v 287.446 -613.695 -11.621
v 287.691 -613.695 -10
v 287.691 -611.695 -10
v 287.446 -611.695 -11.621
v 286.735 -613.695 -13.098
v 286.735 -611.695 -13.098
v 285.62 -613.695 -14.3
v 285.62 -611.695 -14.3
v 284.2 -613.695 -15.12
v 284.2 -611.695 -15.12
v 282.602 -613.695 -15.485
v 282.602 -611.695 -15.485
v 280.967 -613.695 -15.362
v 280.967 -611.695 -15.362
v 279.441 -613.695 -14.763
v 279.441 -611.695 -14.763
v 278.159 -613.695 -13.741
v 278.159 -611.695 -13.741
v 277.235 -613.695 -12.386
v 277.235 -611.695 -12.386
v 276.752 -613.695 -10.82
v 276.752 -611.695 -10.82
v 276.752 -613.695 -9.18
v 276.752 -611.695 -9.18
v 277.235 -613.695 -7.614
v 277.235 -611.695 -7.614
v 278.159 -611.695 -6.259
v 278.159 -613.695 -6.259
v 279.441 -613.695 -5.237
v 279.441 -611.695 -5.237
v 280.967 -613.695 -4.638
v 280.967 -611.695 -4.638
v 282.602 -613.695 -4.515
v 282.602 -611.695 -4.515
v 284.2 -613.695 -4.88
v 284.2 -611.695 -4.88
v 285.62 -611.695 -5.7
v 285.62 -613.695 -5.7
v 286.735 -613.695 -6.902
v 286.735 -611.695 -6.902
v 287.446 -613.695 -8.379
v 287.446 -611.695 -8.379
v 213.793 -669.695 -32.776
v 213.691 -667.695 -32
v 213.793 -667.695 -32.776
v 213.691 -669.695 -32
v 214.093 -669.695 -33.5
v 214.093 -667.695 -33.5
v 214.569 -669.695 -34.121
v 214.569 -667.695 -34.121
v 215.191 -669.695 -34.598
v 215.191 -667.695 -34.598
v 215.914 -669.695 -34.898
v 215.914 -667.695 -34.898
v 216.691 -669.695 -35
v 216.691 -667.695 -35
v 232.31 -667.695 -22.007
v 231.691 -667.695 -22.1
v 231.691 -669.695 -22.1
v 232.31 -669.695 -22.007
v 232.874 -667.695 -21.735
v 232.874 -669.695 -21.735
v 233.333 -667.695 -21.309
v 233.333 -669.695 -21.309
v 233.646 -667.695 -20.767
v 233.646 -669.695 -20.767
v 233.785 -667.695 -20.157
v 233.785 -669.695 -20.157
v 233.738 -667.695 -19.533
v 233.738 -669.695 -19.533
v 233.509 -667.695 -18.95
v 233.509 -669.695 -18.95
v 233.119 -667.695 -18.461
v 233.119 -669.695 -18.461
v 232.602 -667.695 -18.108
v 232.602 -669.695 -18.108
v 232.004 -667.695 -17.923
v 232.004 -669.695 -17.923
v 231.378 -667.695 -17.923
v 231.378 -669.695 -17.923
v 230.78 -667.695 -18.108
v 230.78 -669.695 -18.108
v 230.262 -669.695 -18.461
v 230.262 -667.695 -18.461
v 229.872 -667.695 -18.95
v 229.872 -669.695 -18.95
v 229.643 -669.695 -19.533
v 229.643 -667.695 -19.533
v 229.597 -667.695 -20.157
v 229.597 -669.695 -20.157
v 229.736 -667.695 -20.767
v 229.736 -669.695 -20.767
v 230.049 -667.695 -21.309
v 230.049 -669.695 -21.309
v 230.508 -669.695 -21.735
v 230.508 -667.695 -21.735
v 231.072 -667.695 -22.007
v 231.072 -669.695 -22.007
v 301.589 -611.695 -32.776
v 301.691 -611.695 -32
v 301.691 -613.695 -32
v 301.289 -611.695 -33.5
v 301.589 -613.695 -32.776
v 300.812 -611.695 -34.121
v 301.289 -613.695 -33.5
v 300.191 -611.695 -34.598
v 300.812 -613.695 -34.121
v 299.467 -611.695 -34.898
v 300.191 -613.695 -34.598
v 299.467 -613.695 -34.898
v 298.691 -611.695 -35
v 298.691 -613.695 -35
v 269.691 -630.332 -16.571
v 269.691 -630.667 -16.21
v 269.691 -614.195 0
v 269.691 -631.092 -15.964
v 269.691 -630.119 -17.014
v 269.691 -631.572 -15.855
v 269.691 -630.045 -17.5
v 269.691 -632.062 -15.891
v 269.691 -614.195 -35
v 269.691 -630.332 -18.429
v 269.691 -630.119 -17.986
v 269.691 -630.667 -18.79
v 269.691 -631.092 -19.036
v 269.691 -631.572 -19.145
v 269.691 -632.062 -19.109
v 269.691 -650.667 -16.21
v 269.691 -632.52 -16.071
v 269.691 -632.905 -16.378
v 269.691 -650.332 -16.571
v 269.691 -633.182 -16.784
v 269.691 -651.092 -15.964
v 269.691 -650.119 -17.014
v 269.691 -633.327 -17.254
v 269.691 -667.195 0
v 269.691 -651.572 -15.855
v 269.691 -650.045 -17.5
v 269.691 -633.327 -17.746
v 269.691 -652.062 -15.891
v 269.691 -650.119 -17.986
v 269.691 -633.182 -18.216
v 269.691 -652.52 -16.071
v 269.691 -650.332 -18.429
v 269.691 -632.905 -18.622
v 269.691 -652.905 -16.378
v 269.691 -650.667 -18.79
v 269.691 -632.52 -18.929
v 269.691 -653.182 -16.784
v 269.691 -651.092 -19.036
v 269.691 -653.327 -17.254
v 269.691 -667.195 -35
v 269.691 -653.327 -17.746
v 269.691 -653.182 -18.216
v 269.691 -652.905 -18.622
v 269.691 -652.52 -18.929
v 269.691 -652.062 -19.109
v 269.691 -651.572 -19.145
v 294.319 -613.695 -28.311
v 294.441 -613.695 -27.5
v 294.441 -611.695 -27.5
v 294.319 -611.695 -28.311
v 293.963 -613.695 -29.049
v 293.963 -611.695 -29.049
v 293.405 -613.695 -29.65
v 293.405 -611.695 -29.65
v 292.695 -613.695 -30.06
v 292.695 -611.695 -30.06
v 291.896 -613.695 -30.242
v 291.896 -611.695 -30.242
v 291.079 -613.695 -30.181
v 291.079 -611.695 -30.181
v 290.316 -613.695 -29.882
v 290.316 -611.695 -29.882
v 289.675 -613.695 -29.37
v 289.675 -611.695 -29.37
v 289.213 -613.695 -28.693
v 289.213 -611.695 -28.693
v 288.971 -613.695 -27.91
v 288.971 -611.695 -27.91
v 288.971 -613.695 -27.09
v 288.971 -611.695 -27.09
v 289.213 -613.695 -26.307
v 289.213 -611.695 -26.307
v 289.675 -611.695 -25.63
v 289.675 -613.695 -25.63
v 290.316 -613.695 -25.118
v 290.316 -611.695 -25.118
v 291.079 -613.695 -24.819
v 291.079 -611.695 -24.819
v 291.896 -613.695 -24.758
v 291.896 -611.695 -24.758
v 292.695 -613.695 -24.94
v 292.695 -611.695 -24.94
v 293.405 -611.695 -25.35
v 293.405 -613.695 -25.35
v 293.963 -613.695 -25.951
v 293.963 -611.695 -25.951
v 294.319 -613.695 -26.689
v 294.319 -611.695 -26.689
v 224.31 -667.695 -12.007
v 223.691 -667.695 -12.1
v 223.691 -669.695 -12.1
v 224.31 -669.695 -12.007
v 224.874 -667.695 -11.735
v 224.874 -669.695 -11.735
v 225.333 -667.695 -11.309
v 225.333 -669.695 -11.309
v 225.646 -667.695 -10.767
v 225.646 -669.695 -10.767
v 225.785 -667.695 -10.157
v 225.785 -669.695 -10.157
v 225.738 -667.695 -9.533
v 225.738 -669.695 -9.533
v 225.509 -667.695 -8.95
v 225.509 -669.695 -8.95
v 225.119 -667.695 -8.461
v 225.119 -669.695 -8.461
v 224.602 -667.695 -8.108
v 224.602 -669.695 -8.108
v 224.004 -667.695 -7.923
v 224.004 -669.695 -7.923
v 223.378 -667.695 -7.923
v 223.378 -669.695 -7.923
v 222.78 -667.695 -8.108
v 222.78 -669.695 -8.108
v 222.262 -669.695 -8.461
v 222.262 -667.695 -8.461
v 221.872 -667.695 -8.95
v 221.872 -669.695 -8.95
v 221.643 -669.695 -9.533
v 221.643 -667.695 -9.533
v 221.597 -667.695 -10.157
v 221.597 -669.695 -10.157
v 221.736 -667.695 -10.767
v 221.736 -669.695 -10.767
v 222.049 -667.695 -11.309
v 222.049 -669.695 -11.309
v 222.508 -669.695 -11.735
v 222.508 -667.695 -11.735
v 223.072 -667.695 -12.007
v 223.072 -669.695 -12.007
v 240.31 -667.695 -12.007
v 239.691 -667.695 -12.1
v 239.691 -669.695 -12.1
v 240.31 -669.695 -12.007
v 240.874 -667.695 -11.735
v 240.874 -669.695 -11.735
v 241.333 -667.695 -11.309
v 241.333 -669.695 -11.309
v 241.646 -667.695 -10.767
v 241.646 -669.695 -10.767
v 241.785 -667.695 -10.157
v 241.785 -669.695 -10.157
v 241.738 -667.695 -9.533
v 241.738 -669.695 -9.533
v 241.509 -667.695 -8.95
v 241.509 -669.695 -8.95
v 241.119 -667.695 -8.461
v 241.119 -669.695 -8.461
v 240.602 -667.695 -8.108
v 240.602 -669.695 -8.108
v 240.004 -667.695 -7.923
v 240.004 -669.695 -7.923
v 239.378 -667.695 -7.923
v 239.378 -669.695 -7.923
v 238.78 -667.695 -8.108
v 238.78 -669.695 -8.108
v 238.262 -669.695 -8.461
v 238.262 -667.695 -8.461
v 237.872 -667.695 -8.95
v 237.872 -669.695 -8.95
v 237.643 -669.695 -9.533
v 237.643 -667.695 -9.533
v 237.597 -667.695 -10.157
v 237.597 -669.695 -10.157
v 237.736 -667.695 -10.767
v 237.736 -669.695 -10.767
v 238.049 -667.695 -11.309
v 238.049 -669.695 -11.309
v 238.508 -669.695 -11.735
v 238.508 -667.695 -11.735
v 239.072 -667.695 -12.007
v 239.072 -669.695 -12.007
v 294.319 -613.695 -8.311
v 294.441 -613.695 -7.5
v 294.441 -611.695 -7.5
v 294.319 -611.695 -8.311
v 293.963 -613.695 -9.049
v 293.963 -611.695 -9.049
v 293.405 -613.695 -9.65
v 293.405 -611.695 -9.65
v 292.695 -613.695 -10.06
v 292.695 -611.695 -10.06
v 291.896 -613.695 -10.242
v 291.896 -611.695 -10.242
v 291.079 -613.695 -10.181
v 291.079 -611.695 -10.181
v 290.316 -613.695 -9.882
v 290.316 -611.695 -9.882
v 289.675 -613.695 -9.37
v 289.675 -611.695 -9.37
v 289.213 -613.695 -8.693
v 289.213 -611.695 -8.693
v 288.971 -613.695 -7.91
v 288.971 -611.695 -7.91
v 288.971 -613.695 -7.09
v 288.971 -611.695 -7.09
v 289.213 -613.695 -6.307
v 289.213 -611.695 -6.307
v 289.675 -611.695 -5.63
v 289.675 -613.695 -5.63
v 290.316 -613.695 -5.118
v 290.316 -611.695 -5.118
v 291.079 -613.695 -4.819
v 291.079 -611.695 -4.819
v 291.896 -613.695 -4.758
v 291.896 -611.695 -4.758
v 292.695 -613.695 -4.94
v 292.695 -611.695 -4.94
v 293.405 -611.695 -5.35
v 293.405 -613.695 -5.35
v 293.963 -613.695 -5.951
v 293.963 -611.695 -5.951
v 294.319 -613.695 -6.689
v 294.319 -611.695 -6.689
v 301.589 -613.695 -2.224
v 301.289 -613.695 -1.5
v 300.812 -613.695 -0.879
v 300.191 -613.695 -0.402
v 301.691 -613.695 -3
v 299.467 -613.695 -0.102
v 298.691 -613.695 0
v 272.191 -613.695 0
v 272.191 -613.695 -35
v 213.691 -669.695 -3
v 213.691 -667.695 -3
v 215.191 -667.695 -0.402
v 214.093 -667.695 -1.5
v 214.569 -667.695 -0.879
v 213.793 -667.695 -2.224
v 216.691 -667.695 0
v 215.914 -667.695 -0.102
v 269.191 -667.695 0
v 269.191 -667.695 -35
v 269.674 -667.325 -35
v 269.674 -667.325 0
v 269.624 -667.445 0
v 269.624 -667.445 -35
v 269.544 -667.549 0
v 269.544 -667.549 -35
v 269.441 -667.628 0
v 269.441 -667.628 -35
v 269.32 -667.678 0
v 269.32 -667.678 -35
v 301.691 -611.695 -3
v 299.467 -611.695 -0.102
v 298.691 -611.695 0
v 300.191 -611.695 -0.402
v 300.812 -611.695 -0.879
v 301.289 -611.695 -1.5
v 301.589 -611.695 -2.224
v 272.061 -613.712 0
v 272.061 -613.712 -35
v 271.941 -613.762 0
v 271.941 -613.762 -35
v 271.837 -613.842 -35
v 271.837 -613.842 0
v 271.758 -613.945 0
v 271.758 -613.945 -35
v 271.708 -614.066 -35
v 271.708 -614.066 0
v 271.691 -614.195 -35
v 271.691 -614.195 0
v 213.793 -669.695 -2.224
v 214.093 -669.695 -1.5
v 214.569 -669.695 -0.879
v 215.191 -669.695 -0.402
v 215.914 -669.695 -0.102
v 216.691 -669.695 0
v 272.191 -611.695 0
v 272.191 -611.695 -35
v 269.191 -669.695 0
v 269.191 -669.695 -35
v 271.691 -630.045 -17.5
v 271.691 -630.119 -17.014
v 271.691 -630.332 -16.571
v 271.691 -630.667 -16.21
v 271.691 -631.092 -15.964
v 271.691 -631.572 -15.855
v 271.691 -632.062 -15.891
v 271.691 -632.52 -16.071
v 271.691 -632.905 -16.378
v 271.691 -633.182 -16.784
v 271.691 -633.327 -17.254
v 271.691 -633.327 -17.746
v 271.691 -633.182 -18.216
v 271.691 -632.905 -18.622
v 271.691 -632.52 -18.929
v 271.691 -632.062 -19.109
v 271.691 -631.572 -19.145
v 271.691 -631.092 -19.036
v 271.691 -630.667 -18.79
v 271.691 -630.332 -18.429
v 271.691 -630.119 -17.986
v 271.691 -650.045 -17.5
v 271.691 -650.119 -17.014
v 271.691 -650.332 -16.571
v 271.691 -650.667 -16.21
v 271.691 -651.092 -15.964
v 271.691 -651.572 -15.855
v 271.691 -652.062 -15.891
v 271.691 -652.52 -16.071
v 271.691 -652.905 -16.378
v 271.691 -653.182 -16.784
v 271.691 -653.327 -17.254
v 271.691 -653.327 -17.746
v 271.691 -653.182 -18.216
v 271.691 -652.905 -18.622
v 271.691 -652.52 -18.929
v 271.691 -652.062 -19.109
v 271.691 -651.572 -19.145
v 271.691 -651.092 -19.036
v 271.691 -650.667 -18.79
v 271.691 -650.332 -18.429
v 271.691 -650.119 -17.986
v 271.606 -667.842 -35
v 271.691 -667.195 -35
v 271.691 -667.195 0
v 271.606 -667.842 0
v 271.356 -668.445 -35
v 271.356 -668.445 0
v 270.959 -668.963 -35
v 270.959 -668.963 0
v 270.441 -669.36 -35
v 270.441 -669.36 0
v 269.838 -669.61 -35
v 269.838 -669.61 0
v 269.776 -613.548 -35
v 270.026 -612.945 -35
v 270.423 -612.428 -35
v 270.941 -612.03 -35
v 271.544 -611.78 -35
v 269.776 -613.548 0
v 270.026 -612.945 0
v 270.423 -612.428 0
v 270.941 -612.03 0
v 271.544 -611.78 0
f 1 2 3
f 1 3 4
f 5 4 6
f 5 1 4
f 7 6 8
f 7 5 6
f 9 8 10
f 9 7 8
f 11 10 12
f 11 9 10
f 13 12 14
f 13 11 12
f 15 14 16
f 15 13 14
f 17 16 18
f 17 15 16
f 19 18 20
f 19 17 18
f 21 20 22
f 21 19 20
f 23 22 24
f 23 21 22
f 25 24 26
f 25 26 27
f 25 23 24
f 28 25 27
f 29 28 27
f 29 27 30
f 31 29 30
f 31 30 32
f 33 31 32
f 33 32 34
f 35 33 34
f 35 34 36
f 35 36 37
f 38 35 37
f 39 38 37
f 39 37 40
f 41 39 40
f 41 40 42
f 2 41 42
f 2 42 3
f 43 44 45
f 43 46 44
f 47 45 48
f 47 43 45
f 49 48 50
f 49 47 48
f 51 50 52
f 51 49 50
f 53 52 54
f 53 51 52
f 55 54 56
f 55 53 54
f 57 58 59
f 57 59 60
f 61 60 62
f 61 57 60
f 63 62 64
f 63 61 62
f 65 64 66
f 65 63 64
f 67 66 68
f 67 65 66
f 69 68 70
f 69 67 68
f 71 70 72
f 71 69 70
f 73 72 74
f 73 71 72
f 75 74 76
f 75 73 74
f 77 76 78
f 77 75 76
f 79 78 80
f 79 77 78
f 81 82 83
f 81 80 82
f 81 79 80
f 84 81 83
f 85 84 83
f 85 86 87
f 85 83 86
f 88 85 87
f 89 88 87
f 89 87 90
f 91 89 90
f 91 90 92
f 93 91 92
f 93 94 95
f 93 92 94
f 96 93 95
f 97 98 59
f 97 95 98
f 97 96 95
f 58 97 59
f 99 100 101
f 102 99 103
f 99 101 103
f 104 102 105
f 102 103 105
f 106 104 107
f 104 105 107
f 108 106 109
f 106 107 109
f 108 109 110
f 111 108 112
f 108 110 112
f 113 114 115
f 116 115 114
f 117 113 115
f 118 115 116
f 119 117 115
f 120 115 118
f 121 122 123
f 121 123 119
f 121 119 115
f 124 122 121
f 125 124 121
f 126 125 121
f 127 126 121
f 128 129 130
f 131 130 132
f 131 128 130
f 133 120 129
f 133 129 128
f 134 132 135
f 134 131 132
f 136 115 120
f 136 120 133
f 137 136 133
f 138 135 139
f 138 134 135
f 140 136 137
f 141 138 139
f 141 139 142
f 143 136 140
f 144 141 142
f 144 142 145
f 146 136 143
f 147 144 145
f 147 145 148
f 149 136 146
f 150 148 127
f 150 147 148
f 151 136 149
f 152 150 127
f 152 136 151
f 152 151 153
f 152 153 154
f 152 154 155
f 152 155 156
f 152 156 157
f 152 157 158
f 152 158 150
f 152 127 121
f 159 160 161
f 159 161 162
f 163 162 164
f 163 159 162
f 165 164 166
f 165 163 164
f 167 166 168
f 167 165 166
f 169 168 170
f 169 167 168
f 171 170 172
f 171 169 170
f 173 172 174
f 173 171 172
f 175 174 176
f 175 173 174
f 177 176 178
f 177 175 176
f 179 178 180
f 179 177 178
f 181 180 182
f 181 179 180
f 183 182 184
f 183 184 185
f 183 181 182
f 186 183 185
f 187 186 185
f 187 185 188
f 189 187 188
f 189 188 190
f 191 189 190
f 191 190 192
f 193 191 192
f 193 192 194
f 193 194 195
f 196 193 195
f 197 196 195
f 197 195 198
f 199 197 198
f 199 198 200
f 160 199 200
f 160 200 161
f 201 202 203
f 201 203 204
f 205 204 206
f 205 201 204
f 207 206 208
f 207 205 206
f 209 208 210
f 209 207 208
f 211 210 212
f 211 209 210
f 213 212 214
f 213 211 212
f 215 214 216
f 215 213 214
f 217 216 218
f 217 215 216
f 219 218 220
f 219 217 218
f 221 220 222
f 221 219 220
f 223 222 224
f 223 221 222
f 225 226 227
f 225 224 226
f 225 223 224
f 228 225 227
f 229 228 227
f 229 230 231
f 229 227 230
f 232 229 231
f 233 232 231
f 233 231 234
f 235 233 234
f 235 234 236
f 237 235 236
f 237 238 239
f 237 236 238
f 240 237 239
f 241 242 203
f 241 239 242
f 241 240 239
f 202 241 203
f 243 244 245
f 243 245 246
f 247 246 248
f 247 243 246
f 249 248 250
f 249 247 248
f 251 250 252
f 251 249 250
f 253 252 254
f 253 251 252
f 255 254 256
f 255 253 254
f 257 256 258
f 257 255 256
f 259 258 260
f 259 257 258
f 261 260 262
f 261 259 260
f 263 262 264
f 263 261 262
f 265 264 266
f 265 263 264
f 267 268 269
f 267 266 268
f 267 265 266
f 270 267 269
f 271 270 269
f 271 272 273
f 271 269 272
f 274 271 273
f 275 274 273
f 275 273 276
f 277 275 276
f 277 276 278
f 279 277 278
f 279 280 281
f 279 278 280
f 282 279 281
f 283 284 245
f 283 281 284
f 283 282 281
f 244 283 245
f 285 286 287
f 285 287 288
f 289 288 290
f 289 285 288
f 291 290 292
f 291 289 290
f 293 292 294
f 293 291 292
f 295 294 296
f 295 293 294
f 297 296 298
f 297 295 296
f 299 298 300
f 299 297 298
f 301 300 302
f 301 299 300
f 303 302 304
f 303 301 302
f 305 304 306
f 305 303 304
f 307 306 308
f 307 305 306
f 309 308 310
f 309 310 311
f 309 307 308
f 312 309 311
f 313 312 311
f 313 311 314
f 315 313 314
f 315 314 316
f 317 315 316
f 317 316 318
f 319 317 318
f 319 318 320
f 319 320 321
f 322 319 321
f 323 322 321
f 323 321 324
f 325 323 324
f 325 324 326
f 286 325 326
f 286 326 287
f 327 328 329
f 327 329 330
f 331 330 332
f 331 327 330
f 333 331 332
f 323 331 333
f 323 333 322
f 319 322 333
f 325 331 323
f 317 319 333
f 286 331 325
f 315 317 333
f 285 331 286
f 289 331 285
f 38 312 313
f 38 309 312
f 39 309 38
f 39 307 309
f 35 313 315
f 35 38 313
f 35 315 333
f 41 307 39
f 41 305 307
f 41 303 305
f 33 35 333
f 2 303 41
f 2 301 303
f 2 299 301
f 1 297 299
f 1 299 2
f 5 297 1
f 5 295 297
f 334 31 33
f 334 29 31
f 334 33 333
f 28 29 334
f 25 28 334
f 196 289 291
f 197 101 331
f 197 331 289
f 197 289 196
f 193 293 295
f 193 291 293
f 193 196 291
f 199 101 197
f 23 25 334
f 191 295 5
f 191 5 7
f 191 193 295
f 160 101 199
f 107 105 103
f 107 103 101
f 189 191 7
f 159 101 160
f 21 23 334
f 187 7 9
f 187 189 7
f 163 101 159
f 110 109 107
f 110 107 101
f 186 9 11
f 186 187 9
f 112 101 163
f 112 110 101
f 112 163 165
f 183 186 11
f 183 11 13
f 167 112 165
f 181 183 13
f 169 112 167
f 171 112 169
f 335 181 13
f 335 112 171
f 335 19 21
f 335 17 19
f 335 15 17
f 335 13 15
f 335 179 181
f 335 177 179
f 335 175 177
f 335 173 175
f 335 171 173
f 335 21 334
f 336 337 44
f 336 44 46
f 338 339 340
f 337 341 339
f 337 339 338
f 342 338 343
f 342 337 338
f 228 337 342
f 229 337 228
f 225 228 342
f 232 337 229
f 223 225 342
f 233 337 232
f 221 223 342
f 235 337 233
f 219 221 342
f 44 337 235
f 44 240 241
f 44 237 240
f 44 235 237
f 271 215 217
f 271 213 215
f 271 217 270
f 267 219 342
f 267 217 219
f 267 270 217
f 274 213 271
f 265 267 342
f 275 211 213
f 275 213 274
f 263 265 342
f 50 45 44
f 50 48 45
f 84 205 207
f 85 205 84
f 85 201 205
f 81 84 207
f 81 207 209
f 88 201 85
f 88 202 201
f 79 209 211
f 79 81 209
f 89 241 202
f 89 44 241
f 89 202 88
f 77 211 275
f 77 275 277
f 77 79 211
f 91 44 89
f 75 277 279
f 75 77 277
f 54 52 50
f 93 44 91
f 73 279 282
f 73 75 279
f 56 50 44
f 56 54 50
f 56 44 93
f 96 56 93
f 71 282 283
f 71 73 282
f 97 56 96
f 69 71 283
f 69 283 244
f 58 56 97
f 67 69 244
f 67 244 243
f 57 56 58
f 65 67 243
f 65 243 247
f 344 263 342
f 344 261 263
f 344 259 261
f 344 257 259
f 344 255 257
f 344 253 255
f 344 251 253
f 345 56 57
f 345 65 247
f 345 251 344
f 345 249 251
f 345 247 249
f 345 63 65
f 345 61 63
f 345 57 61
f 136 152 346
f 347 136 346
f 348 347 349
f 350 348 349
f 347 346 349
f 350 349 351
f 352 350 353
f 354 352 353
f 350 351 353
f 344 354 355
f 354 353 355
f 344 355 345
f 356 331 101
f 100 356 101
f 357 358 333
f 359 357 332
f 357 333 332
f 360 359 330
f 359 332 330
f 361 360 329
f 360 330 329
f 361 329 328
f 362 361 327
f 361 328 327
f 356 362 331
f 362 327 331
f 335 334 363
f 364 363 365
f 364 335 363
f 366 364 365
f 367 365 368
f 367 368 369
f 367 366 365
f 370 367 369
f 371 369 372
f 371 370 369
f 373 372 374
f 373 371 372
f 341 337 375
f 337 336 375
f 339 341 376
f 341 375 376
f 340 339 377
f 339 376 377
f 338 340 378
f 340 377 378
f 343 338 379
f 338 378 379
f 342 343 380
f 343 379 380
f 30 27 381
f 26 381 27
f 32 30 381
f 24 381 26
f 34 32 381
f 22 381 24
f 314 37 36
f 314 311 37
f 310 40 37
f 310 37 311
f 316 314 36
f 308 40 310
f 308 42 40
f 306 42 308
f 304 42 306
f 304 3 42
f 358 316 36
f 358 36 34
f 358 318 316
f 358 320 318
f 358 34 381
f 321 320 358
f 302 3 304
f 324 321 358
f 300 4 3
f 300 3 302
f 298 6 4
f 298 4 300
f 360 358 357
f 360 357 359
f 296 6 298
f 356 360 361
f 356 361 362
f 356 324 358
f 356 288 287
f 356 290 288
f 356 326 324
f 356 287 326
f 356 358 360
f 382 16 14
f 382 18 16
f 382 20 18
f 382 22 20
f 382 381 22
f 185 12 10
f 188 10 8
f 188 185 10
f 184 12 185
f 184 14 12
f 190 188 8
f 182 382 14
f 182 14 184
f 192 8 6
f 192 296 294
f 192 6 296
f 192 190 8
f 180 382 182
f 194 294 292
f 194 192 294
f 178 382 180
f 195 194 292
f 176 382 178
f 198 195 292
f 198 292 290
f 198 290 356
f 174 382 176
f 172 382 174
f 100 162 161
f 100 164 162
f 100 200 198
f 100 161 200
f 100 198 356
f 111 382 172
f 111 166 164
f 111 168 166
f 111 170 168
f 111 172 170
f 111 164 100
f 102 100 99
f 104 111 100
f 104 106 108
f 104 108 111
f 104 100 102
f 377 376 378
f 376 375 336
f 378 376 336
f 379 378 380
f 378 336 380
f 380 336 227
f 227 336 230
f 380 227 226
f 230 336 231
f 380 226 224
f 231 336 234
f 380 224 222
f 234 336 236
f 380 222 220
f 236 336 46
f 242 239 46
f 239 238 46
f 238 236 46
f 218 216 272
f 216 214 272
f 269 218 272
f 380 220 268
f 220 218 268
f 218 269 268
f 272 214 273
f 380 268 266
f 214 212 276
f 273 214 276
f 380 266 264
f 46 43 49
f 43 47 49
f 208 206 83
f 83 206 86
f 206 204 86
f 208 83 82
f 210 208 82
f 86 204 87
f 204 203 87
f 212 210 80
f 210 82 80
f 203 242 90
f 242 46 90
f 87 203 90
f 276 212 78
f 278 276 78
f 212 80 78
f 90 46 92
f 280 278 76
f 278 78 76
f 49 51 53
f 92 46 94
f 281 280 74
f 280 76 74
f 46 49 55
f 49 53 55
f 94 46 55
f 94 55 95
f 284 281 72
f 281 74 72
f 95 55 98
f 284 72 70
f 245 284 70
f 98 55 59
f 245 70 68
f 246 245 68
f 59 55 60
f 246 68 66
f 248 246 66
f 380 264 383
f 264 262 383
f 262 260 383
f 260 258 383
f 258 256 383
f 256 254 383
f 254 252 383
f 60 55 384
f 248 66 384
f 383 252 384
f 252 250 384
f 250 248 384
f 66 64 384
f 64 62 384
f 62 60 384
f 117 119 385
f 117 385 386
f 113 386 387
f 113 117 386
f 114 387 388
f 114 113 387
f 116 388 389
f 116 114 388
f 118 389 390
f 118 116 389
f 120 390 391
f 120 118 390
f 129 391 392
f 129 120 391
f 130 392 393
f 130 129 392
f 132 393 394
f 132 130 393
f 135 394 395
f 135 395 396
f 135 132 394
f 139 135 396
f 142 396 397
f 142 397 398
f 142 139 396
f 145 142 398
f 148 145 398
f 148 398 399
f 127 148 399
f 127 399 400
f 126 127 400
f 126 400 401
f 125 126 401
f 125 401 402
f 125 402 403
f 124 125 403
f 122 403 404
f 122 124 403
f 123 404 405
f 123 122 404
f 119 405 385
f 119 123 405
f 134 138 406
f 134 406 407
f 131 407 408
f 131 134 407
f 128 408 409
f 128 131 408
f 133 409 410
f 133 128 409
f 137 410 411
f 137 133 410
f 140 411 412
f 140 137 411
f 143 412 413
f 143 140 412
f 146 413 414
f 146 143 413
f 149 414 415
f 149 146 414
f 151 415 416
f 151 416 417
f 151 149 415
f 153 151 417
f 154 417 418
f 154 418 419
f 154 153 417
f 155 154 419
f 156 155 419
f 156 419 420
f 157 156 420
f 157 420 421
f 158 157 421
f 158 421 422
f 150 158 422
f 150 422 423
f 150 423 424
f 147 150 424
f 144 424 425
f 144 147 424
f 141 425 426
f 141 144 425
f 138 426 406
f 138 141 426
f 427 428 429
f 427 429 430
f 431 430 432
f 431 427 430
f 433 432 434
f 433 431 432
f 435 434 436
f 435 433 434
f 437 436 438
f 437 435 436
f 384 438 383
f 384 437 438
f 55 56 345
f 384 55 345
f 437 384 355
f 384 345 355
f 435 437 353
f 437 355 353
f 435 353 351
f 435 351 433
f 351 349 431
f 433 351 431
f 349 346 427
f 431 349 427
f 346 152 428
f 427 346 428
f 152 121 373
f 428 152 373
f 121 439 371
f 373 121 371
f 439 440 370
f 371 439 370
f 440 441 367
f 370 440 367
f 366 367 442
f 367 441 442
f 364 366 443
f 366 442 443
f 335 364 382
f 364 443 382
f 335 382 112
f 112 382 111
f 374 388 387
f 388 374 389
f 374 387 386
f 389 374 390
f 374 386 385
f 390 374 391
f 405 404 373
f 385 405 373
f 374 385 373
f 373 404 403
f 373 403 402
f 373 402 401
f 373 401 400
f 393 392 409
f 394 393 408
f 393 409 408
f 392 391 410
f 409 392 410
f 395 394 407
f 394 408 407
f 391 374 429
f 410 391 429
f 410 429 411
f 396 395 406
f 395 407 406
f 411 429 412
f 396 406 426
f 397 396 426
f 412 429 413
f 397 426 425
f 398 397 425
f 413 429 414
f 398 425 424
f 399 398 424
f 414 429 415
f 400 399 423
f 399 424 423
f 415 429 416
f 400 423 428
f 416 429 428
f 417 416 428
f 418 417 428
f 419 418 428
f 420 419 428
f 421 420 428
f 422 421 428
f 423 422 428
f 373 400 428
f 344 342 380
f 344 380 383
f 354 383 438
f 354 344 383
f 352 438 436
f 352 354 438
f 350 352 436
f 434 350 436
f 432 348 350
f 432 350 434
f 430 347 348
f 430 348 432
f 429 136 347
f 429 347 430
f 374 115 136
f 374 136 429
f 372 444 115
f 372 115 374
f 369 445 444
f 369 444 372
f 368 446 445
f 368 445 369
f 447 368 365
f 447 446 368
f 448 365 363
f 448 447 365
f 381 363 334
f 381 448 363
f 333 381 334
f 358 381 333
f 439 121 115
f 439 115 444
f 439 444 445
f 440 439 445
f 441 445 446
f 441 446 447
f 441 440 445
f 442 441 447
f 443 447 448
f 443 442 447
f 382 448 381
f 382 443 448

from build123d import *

# Parameters (mm, degrees)
EXTRUDE_1_DEPTH               = 35
FILLET_1_R                    = 3
CUT_EXTRUDE_2_DEPTH           = 310.2026821
CUT_EXTRUDE_2_DEPTH_BACK      = 310.2026821
SKETCH_5_R                    = 2.1
SKETCH_5_R_2                  = 5.5
SKETCH_5_R_3                  = 2.75
SKETCH_6_R                    = 1.65
CUT_EXTRUDE_3_DEPTH           = 35
SHEET_START                   = -667.695268107
SHEET_METAL_1_OUTLINE_R       = 2.75
SHEET_METAL_1_OUTLINE_R_2     = 5.5
SHEET_METAL_1_DEPTH           = 56
SHEET_START_2                 = -669.695268107
SHEET_METAL_1_2_OUTLINE_R     = 1.65
SHEET_METAL_1_2_OUTLINE_R_2   = 2.75
SHEET_METAL_1_2_OUTLINE_R_3   = 5.5
SHEET_METAL_1_2_DEPTH         = 2
SHEET_METAL_1_3_OUTLINE_R     = 1.65
SHEET_METAL_1_3_OUTLINE_R_2   = 2.75
SHEET_METAL_1_3_OUTLINE_R_3   = 5.5
SHEET_METAL_1_3_DEPTH         = 2
SHEET_START_3                 = -650.045268007
SHEET_METAL_1_3_2_OUTLINE_W   = 2
SHEET_METAL_1_3_2_OUTLINE_H   = 35
SHEET_METAL_1_3_2_DEPTH       = 16.6999998
SHEET_START_4                 = -630.045268007
SHEET_METAL_1_3_3_OUTLINE_W   = 2
SHEET_METAL_1_3_3_OUTLINE_H   = 35
SHEET_METAL_1_3_3_DEPTH       = 15.8499999
SHEET_START_5                 = -667.459318107
SHEET_METAL_1_3_4_OUTLINE_W   = 2
SHEET_METAL_1_3_4_OUTLINE_H   = 35
SHEET_METAL_1_3_4_DEPTH       = 14.1140499
SHEET_START_6                 = -613.695268107
SHEET_METAL_1_3_5_OUTLINE_R   = 1.65
SHEET_METAL_1_3_5_DEPTH       = 2
SHEET_START_7                 = -614.195268107
SHEET_METAL_1_3_6_OUTLINE_R   = 5.5
SHEET_METAL_1_3_6_OUTLINE_R_2 = 2.75
SHEET_METAL_1_3_6_OUTLINE_R_3 = 1.65
SHEET_METAL_1_3_6_DEPTH       = 2.5
SHEET_START_8                 = -653.345268207
SHEET_METAL_1_3_7_OUTLINE_W   = 2
SHEET_METAL_1_3_7_OUTLINE_H   = 35
SHEET_METAL_1_3_7_DEPTH       = 23.3000002
SHEET_METAL_1_3_8_OUTLINE_W   = 2
SHEET_METAL_1_3_8_OUTLINE_H   = 35
SHEET_METAL_1_3_8_DEPTH       = 0.23595
SHEET_START_9                 = -35
SHEET_METAL_1_3_9_DEPTH       = 35
SHEET_START_10                = 269.690733397
SHEET_METAL_1_3_10_OUTLINE_R  = 1.65
SHEET_METAL_1_3_10_DEPTH      = 2
SHEET_METAL_1_3_11_DEPTH      = 35


with BuildPart() as part:
    # Sketch 2 → 凸台-拉伸1 (new body)
    with BuildSketch(Plane.XY):
        with BuildLine():
            Line((298.690733397, -611.695268107), (272.190733397, -611.695268107))
            ThreePointArc((272.190733397, -611.695268107), (270.422966444, -612.427501154), (269.690733397, -614.195268107))
            Line((269.690733397, -614.195268107), (269.690733397, -667.195268107))
            ThreePointArc((269.690733397, -667.195268107), (269.544286788, -667.548821498), (269.190733397, -667.695268107))
            Line((269.190733397, -667.695268107), (216.690733397, -667.695268107))
            Line((216.690733397, -667.695268107), (213.690733397, -667.695268107))
            Line((213.690733397, -667.695268107), (213.690733397, -669.695268107))
            Line((213.690733397, -669.695268107), (216.690733397, -669.695268107))
            Line((216.690733397, -669.695268107), (269.190733397, -669.695268107))
            ThreePointArc((269.190733397, -669.695268107), (270.95850035, -668.96303506), (271.690733397, -667.195268107))
            Line((271.690733397, -667.195268107), (271.690733397, -614.195268107))
            ThreePointArc((271.690733397, -614.195268107), (271.837180006, -613.841714717), (272.190733397, -613.695268107))
            Line((272.190733397, -613.695268107), (298.690733397, -613.695268107))
            Line((298.690733397, -613.695268107), (301.690733397, -613.695268107))
            Line((301.690733397, -613.695268107), (301.690733397, -611.695268107))
            Line((301.690733397, -611.695268107), (298.690733397, -611.695268107))
        make_face()
    extrude(amount=-EXTRUDE_1_DEPTH)

    # 圆角1
    fillet_1_edges = [part.edges().sort_by_distance(p)[0] for p in [
        (301.690733397, -612.695268107, -35),
        (213.690733397, -668.695268107, 0),
        (301.690733397, -612.695268107, 0),
        (213.690733397, -668.695268107, -35),
    ]]
    fillet(fillet_1_edges, radius=FILLET_1_R)

    # 草图5 → 切除-拉伸2 (cut, two sides: drawn at the far end of the back side and taken through both)
    with BuildSketch(Plane.XZ.offset(669.695268107).offset(-CUT_EXTRUDE_2_DEPTH_BACK)):
        with Locations(Location((223.690733397, -10, 0), (0, 0, 270))):
            Circle(SKETCH_5_R)
        with Locations(Location((239.690733397, -10, 0), (0, 0, 270))):
            Circle(SKETCH_5_R)
        with Locations(Location((231.690733397, -20, 0), (0, 0, 270))):
            Circle(SKETCH_5_R)
        with Locations(Location((282.190733397, -10, 0), (0, 0, 270))):
            Circle(SKETCH_5_R_2)
        with Locations(Location((291.690733397, -7.5, 0), (0, 0, 270))):
            Circle(SKETCH_5_R_3)
        with Locations(Location((291.690733397, -27.5, 0), (0, 0, 270))):
            Circle(SKETCH_5_R_3)
    extrude(amount=CUT_EXTRUDE_2_DEPTH + CUT_EXTRUDE_2_DEPTH_BACK, mode=Mode.SUBTRACT)

    # 草图6 → 切除-拉伸3 (cut)
    with BuildSketch(Plane.ZY.offset(-269.690733397)):
        with Locations(Location((-17.5, -651.695268107, 0), (0, 0, 270))):
            Circle(SKETCH_6_R)
        with Locations(Location((-17.5, -631.695268107, 0), (0, 0, 270))):
            Circle(SKETCH_6_R)
    extrude(amount=-CUT_EXTRUDE_3_DEPTH, mode=Mode.SUBTRACT)

    # Sheet Metal 1: read off the stored shape, not the designer's step
    # Sheet Metal 1 outline → Sheet Metal 1 (cut)
    with BuildSketch(Plane(origin=(0, 0, 0), x_dir=(1, 0, 0), z_dir=(0, 1, 0)).offset(SHEET_START)):
        with BuildLine():
            ThreePointArc((298.690733397, 0), (300.812053741, 0.878679656), (301.690733397, 3))
            Line((301.690733397, 3), (301.690733397, 32))
            ThreePointArc((301.690733397, 32), (300.812053741, 34.121320344), (298.690733397, 35))
            Line((298.690733397, 35), (269.190733397, 35))
            Line((269.190733397, 35), (269.190733397, 0))
            Line((269.190733397, 0), (298.690733397, 0))
        make_face()
        with Locations((291.690733397, 7.5)):
            Circle(SHEET_METAL_1_OUTLINE_R, mode=Mode.SUBTRACT)
        with Locations((282.190733397, 10)):
            Circle(SHEET_METAL_1_OUTLINE_R_2, mode=Mode.SUBTRACT)
        with Locations((291.690733397, 27.5)):
            Circle(SHEET_METAL_1_OUTLINE_R, mode=Mode.SUBTRACT)
    extrude(amount=SHEET_METAL_1_DEPTH, mode=Mode.SUBTRACT)

    # Sheet Metal 1 2 outline → Sheet Metal 1 2 (add)
    with BuildSketch(Plane(origin=(0, 0, 0), x_dir=(1, 0, 0), z_dir=(0, 1, 0)).offset(SHEET_START_2)):
        with BuildLine():
            ThreePointArc((351.890733397, 0), (354.012053741, 0.878679656), (354.890733397, 3))
            Line((354.890733397, 3), (354.890733397, 32))
            ThreePointArc((354.890733397, 32), (354.012053741, 34.121320344), (351.890733397, 35))
            Line((351.890733397, 35), (269.190733397, 35))
            Line((269.190733397, 35), (269.190733397, 0))
            Line((269.190733397, 0), (351.890733397, 0))
        make_face()
        with Locations((306.290733397, 17.5)):
            Circle(SHEET_METAL_1_2_OUTLINE_R, mode=Mode.SUBTRACT)
        with Locations((286.290733397, 17.5)):
            Circle(SHEET_METAL_1_2_OUTLINE_R, mode=Mode.SUBTRACT)
        with Locations((344.890733397, 27.5)):
            Circle(SHEET_METAL_1_2_OUTLINE_R_2, mode=Mode.SUBTRACT)
        with Locations((344.890733397, 7.5)):
            Circle(SHEET_METAL_1_2_OUTLINE_R_2, mode=Mode.SUBTRACT)
        with Locations((335.390733397, 10)):
            Circle(SHEET_METAL_1_2_OUTLINE_R_3, mode=Mode.SUBTRACT)
    extrude(amount=SHEET_METAL_1_2_DEPTH)

    # Sheet Metal 1 3: read off the stored shape, not the designer's step
    # Sheet Metal 1 3 outline → Sheet Metal 1 3 (cut)
    with BuildSketch(Plane(origin=(0, 0, 0), x_dir=(1, 0, 0), z_dir=(0, 1, 0)).offset(SHEET_START_2)):
        with BuildLine():
            ThreePointArc((351.890733397, 0), (354.012053741, 0.878679656), (354.890733397, 3))
            Line((354.890733397, 3), (354.890733397, 32))
            ThreePointArc((354.890733397, 32), (354.012053741, 34.121320344), (351.890733397, 35))
            Line((351.890733397, 35), (271.690733397, 35))
            Line((271.690733397, 35), (271.690733397, 0))
            Line((271.690733397, 0), (351.890733397, 0))
        make_face()
        with Locations((286.290733397, 17.5)):
            Circle(SHEET_METAL_1_3_OUTLINE_R, mode=Mode.SUBTRACT)
        with Locations((344.890733397, 7.5)):
            Circle(SHEET_METAL_1_3_OUTLINE_R_2, mode=Mode.SUBTRACT)
        with Locations((335.390733397, 10)):
            Circle(SHEET_METAL_1_3_OUTLINE_R_3, mode=Mode.SUBTRACT)
        with Locations((344.890733397, 27.5)):
            Circle(SHEET_METAL_1_3_OUTLINE_R_2, mode=Mode.SUBTRACT)
        with Locations((306.290733397, 17.5)):
            Circle(SHEET_METAL_1_3_OUTLINE_R, mode=Mode.SUBTRACT)
    extrude(amount=SHEET_METAL_1_3_DEPTH, mode=Mode.SUBTRACT)



with BuildPart() as body_2:
    # Sheet Metal 1 3 2 outline → Sheet Metal 1 3 2 (new body)
    with BuildSketch(Plane(origin=(0, 0, 0), x_dir=(1, 0, 0), z_dir=(0, 1, 0)).offset(SHEET_START_3)):
        with Locations((270.690733397, 17.5)):
            Rectangle(SHEET_METAL_1_3_2_OUTLINE_W, SHEET_METAL_1_3_2_OUTLINE_H)
    extrude(amount=SHEET_METAL_1_3_2_DEPTH)



with BuildPart() as body_3:
    # Sheet Metal 1 3 3 outline → Sheet Metal 1 3 3 (new body)
    with BuildSketch(Plane(origin=(0, 0, 0), x_dir=(1, 0, 0), z_dir=(0, 1, 0)).offset(SHEET_START_4)):
        with Locations((270.690733397, 17.5)):
            Rectangle(SHEET_METAL_1_3_3_OUTLINE_W, SHEET_METAL_1_3_3_OUTLINE_H)
    extrude(amount=SHEET_METAL_1_3_3_DEPTH)



with BuildPart() as body_4:
    # Sheet Metal 1 3 4 outline → Sheet Metal 1 3 4 (new body)
    with BuildSketch(Plane(origin=(0, 0, 0), x_dir=(1, 0, 0), z_dir=(0, 1, 0)).offset(SHEET_START_5)):
        with Locations((270.690733397, 17.5)):
            Rectangle(SHEET_METAL_1_3_4_OUTLINE_W, SHEET_METAL_1_3_4_OUTLINE_H)
    extrude(amount=SHEET_METAL_1_3_4_DEPTH)


with BuildPart() as body_5:
    # Sheet Metal 1 3 5 outline → Sheet Metal 1 3 5 (new body)
    with BuildSketch(Plane(origin=(0, 0, 0), x_dir=(1, 0, 0), z_dir=(0, 1, 0)).offset(SHEET_START_6)):
        with Locations((286.290733397, 17.5)):
            Circle(SHEET_METAL_1_3_5_OUTLINE_R)
    extrude(amount=SHEET_METAL_1_3_5_DEPTH)


with BuildPart() as body_3_1:
    add(body_3.part)

    add(body_5.part)  # Sheet Metal 1 3 6 merges body 5
    # Sheet Metal 1 3 6 outline → Sheet Metal 1 3 6 (add)
    with BuildSketch(Plane(origin=(0, 0, 0), x_dir=(1, 0, 0), z_dir=(0, 1, 0)).offset(SHEET_START_7)):
        with BuildLine():
            ThreePointArc((298.690733397, 0), (300.812053741, 0.878679656), (301.690733397, 3))
            Line((301.690733397, 3), (301.690733397, 32))
            ThreePointArc((301.690733397, 32), (300.812053741, 34.121320344), (298.690733397, 35))
            Line((298.690733397, 35), (269.690733397, 35))
            Line((269.690733397, 35), (269.690733397, 0))
            Line((269.690733397, 0), (298.690733397, 0))
        make_face()
        with Locations((282.190733397, 10)):
            Circle(SHEET_METAL_1_3_6_OUTLINE_R, mode=Mode.SUBTRACT)
        with Locations((291.690733397, 7.5)):
            Circle(SHEET_METAL_1_3_6_OUTLINE_R_2, mode=Mode.SUBTRACT)
        with Locations((286.290733397, 17.5)):
            Circle(SHEET_METAL_1_3_6_OUTLINE_R_3, mode=Mode.SUBTRACT)
        with Locations((291.690733397, 27.5)):
            Circle(SHEET_METAL_1_3_6_OUTLINE_R_2, mode=Mode.SUBTRACT)
    extrude(amount=SHEET_METAL_1_3_6_DEPTH)


with BuildPart() as body_2_1:
    add(body_2.part)

    add(body_3_1.part)  # Sheet Metal 1 3 7 merges body 3

    add(body_4.part)  # Sheet Metal 1 3 7 merges body 4
    # Sheet Metal 1 3 7 outline → Sheet Metal 1 3 7 (add)
    with BuildSketch(Plane(origin=(0, 0, 0), x_dir=(1, 0, 0), z_dir=(0, 1, 0)).offset(SHEET_START_8)):
        with Locations((270.690733397, 17.5)):
            Rectangle(SHEET_METAL_1_3_7_OUTLINE_W, SHEET_METAL_1_3_7_OUTLINE_H)
    extrude(amount=SHEET_METAL_1_3_7_DEPTH)


with BuildPart() as part_1:
    add(part.part)

    add(body_2_1.part)  # Sheet Metal 1 3 8 merges body 2
    # Sheet Metal 1 3 8 outline → Sheet Metal 1 3 8 (add)
    with BuildSketch(Plane(origin=(0, 0, 0), x_dir=(1, 0, 0), z_dir=(0, 1, 0)).offset(SHEET_START)):
        with Locations((270.690733397, 17.5)):
            Rectangle(SHEET_METAL_1_3_8_OUTLINE_W, SHEET_METAL_1_3_8_OUTLINE_H)
    extrude(amount=SHEET_METAL_1_3_8_DEPTH)

    # Sheet Metal 1 3 9 outline → Sheet Metal 1 3 9 (add)
    with BuildSketch(Plane.XY.offset(SHEET_START_9)):
        with BuildLine():
            Line((269.690733397, -667.695268107), (269.690733397, -667.195268107))
            ThreePointArc((269.690733397, -667.195268107), (269.544286788, -667.548821498), (269.190733397, -667.695268107))
            Line((269.190733397, -667.695268107), (269.690733397, -667.695268107))
        make_face()
    extrude(amount=SHEET_METAL_1_3_9_DEPTH)

    # Sheet Metal 1 3 10 outline → Sheet Metal 1 3 10 (cut)
    with BuildSketch(Plane.YZ.offset(SHEET_START_10)):
        with Locations((-631.695268107, -17.5)):
            Circle(SHEET_METAL_1_3_10_OUTLINE_R)
        with Locations((-651.695268107, -17.5)):
            Circle(SHEET_METAL_1_3_10_OUTLINE_R)
    extrude(amount=SHEET_METAL_1_3_10_DEPTH, mode=Mode.SUBTRACT)

    # Sheet Metal 1 3 11 outline → Sheet Metal 1 3 11 (cut)
    with BuildSketch(Plane.XY.offset(SHEET_START_9)):
        with BuildLine():
            Line((271.690733397, -669.695268107), (271.690733397, -667.195268107))
            ThreePointArc((271.690733397, -667.195268107), (270.95850035, -668.96303506), (269.190733397, -669.695268107))
            Line((269.190733397, -669.695268107), (271.690733397, -669.695268107))
        make_face()
        with BuildLine():
            ThreePointArc((269.690733397, -614.195268107), (270.422966444, -612.427501154), (272.190733397, -611.695268107))
            Line((272.190733397, -611.695268107), (269.690733397, -611.695268107))
            Line((269.690733397, -611.695268107), (269.690733397, -614.195268107))
        make_face()
        with BuildLine():
            ThreePointArc((272.190733397, -613.695268107), (271.837180006, -613.841714716), (271.690733397, -614.195268107))
            Line((271.690733397, -614.195268107), (301.690733397, -614.195268107))
            Line((301.690733397, -614.195268107), (301.690733397, -613.695268107))
            Line((301.690733397, -613.695268107), (272.190733397, -613.695268107))
        make_face()
    extrude(amount=SHEET_METAL_1_3_11_DEPTH, mode=Mode.SUBTRACT)


solid = part_1.part
